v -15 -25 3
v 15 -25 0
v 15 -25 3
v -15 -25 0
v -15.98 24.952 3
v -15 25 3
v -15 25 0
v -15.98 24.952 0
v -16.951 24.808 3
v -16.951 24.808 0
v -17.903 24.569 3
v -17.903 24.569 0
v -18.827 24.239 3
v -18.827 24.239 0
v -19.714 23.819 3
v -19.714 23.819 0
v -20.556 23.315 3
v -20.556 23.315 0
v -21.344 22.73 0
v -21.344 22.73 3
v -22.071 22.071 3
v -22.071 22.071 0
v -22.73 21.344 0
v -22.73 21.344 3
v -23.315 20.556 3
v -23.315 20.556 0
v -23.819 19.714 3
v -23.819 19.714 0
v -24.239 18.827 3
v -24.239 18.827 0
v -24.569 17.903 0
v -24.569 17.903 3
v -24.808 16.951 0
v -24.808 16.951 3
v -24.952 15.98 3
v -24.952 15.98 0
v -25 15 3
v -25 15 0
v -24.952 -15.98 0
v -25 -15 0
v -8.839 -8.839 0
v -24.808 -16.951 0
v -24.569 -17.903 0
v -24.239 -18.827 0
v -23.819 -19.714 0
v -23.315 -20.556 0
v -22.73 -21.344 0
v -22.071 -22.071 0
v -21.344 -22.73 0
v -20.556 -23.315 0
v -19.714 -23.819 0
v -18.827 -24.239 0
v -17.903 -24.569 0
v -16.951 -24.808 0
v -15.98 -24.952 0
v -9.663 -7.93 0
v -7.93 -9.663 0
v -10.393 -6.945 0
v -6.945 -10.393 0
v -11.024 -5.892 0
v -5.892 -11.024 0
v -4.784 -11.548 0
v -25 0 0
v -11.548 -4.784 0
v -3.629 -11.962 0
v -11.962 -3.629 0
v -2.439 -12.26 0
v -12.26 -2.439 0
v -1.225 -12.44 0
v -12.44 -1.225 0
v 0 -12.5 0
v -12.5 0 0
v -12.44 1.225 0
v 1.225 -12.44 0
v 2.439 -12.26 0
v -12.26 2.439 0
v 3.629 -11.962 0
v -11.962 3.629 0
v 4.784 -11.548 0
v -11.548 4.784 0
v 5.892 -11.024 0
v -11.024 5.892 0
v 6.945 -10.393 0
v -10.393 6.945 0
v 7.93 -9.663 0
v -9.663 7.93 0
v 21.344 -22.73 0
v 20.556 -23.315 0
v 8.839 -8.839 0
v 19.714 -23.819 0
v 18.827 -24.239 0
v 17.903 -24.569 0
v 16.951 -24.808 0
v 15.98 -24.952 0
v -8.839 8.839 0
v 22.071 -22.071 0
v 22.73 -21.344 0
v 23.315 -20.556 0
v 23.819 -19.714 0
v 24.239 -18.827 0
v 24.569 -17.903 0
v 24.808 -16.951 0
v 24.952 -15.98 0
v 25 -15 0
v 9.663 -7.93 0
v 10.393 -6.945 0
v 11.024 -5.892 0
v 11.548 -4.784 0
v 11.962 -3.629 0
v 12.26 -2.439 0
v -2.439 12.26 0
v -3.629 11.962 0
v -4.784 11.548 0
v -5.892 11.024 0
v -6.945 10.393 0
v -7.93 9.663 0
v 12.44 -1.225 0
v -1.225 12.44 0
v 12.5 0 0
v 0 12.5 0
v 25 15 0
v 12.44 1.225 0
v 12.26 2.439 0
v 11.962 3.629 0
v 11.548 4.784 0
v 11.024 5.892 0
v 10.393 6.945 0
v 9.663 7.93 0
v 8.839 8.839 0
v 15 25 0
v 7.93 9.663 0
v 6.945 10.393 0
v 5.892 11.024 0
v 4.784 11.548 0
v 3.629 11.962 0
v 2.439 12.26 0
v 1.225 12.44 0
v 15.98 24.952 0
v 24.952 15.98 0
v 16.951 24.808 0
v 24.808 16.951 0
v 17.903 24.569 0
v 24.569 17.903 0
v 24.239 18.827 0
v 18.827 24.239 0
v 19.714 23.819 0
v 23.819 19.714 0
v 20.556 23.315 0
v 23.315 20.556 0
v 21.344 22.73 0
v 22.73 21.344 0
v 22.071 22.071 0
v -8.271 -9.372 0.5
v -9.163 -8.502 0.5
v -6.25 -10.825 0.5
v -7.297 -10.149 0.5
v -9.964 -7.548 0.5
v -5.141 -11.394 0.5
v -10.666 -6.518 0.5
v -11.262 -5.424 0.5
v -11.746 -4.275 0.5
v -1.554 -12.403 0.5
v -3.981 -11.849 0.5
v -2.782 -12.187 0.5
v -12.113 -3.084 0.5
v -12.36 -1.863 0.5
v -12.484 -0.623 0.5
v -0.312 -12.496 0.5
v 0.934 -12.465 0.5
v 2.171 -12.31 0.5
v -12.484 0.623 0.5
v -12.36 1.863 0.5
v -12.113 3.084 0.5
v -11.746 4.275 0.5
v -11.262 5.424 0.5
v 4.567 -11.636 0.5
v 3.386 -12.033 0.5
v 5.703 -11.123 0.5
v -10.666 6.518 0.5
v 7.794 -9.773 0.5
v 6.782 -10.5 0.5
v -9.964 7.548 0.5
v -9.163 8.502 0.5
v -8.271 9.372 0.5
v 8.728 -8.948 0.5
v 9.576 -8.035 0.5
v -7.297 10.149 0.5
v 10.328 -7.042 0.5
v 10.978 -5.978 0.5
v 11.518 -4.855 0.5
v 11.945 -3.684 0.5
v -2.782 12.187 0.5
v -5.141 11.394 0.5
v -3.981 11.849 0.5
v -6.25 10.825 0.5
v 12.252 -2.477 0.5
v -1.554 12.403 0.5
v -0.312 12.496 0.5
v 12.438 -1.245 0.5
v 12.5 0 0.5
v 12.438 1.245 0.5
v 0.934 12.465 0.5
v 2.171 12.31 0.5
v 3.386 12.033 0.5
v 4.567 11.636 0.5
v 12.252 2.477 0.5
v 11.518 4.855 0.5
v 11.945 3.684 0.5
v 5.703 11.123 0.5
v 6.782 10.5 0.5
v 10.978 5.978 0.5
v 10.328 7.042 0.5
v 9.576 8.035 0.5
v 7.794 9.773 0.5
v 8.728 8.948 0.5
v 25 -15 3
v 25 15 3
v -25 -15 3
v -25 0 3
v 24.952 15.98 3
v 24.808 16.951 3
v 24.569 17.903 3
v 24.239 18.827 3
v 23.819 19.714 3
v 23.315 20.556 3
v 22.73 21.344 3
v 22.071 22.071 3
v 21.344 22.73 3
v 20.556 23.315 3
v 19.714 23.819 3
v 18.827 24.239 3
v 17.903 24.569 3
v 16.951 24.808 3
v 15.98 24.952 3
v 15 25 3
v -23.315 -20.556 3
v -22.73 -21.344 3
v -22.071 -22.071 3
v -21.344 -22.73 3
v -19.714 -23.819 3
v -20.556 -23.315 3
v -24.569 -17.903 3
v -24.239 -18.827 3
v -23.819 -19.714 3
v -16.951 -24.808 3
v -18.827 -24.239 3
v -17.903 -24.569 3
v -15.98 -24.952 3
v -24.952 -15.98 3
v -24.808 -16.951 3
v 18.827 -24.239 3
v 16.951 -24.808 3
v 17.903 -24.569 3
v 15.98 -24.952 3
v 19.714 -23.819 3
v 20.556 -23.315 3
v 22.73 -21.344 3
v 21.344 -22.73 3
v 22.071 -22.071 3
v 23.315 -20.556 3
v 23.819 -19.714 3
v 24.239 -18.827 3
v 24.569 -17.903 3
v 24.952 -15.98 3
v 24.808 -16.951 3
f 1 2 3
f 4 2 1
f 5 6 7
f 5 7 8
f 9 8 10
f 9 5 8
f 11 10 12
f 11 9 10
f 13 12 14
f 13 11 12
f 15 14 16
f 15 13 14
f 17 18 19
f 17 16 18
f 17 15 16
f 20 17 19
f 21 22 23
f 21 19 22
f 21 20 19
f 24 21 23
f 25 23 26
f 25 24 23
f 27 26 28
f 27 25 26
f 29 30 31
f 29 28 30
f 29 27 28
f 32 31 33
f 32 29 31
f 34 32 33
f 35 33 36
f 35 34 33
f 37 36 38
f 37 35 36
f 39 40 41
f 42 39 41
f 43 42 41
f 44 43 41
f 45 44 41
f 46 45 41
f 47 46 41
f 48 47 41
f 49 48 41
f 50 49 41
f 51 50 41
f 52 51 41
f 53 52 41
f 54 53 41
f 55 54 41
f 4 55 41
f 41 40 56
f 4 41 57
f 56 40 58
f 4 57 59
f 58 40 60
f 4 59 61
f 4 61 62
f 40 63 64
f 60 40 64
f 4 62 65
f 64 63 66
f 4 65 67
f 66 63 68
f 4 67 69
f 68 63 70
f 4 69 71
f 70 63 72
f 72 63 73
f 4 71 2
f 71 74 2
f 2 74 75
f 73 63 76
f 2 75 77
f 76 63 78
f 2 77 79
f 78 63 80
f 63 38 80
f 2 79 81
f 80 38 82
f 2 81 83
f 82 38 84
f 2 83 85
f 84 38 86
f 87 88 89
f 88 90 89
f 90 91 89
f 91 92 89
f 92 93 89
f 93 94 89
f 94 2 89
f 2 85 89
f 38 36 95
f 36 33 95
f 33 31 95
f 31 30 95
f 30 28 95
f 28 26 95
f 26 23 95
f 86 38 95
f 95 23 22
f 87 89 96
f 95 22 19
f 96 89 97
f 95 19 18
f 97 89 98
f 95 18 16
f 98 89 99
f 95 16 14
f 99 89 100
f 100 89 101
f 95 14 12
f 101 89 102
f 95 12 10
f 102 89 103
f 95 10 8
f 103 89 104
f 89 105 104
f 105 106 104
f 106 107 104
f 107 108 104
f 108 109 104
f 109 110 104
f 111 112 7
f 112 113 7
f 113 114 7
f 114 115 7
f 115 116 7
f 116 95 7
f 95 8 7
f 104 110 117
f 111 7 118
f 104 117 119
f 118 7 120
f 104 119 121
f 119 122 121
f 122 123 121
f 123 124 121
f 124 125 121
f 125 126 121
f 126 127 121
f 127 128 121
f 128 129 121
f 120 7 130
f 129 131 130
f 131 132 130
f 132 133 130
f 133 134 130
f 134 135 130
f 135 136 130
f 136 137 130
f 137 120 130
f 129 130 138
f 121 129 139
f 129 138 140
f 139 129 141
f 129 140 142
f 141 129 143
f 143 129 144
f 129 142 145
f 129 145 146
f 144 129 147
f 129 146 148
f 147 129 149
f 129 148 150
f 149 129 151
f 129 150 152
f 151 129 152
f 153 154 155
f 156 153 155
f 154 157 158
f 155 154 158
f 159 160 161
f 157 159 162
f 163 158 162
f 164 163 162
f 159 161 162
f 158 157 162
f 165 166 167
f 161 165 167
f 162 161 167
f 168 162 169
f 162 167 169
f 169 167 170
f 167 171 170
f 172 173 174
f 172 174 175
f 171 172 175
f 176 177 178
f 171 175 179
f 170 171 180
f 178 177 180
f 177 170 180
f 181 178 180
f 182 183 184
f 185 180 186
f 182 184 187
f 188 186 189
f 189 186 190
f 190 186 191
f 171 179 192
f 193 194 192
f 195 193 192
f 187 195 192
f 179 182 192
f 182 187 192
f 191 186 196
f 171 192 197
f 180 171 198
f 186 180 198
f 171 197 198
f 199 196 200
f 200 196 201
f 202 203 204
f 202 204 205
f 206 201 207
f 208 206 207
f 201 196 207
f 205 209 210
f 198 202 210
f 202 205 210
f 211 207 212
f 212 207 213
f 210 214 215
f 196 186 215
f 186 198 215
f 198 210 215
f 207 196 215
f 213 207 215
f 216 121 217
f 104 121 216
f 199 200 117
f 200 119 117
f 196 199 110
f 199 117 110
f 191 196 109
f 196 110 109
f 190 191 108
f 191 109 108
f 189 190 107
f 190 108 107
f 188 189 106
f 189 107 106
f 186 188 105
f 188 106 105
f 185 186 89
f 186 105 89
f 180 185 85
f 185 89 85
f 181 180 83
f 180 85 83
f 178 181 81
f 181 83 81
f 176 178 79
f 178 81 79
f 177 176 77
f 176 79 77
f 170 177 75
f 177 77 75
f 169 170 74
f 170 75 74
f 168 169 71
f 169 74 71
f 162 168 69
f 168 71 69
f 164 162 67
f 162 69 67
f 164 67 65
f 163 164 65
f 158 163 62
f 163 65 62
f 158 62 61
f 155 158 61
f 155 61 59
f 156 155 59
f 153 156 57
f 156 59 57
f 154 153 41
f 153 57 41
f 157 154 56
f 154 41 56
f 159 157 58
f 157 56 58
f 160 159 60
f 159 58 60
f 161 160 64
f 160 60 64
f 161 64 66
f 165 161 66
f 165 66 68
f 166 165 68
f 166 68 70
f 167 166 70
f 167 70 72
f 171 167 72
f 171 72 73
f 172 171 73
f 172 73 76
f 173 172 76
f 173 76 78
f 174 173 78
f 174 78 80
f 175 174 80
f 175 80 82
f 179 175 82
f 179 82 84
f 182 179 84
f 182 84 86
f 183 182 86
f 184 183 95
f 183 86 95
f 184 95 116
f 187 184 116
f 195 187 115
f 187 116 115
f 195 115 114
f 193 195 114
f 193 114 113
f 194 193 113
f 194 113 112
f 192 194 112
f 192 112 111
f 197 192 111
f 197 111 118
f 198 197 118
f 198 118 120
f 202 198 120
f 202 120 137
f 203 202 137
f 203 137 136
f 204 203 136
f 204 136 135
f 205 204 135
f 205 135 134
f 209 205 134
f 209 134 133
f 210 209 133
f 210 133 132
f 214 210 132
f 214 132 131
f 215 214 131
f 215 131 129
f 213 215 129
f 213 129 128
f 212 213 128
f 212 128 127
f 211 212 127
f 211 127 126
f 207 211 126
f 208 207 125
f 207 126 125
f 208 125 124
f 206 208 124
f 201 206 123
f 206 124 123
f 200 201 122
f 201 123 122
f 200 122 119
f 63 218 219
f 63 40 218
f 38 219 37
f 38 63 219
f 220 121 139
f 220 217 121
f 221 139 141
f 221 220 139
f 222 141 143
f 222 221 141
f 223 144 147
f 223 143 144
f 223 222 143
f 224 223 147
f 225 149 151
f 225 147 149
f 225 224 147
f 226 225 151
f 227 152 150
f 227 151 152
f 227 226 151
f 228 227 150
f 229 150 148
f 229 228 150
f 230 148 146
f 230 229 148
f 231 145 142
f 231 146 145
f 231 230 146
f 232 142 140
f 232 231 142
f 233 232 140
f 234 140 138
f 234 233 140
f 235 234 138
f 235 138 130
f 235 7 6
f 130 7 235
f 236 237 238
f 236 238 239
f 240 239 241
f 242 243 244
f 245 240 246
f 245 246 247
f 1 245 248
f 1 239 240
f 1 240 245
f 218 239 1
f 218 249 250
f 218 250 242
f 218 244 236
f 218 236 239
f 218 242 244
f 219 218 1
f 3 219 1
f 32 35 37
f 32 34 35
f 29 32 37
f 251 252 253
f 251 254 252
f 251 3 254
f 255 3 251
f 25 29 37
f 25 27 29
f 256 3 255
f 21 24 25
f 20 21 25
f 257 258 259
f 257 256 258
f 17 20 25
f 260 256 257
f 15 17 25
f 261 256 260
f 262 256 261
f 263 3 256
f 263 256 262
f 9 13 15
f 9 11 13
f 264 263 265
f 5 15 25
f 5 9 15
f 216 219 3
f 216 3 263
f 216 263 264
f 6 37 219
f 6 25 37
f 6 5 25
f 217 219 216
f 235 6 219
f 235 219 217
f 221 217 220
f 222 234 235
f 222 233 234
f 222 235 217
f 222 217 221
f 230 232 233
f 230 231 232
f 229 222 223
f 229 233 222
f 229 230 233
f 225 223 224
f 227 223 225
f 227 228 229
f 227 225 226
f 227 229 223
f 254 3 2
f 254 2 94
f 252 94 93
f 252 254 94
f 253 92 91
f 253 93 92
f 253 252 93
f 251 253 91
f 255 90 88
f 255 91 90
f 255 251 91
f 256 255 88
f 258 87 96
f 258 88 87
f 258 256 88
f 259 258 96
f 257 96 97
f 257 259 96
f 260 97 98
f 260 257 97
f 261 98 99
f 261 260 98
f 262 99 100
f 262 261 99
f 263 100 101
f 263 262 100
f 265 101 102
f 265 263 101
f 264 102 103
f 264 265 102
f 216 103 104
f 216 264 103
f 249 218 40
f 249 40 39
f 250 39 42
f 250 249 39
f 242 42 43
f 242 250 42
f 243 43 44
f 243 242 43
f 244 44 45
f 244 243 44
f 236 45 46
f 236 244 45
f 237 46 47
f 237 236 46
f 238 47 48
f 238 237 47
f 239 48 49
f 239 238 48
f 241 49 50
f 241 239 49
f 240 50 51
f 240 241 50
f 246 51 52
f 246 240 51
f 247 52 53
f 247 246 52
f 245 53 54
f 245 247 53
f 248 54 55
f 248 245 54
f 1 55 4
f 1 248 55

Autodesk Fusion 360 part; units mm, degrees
sketch "Sketch1" plane through (0, 0, 0) normal (0, 0, 1) x (1, 0, 0)
  circle A0 centre (0, 0) radius 12.5
  line L0 (0, 0) -> (-25, 0)
  line L1 (-25, 25) -> (25, 25)
  line L2 (25, 25) -> (25, -25)
  line L3 (25, -25) -> (-25, -25)
  line L4 (-25, -25) -> (-25, 25)
  dimension "d1" = 25
extrude "Extrude1" add sketch "Sketch1" along normal blind 3 contours A0 | L1 L2 L3 L4
extrude "Extrude2" cut sketch "Sketch1" along normal blind 0.5 contours A0
fillet "Fillet1" radius 10 4 edges at (25, -25, 1.5) (25, 25, 1.5) (-25, 25, 1.5) (-25, -25, 1.5)
sketch "Sketch2" plane through (0, 0, 0) normal (0, 0, 1) x (1, 0, 0)
